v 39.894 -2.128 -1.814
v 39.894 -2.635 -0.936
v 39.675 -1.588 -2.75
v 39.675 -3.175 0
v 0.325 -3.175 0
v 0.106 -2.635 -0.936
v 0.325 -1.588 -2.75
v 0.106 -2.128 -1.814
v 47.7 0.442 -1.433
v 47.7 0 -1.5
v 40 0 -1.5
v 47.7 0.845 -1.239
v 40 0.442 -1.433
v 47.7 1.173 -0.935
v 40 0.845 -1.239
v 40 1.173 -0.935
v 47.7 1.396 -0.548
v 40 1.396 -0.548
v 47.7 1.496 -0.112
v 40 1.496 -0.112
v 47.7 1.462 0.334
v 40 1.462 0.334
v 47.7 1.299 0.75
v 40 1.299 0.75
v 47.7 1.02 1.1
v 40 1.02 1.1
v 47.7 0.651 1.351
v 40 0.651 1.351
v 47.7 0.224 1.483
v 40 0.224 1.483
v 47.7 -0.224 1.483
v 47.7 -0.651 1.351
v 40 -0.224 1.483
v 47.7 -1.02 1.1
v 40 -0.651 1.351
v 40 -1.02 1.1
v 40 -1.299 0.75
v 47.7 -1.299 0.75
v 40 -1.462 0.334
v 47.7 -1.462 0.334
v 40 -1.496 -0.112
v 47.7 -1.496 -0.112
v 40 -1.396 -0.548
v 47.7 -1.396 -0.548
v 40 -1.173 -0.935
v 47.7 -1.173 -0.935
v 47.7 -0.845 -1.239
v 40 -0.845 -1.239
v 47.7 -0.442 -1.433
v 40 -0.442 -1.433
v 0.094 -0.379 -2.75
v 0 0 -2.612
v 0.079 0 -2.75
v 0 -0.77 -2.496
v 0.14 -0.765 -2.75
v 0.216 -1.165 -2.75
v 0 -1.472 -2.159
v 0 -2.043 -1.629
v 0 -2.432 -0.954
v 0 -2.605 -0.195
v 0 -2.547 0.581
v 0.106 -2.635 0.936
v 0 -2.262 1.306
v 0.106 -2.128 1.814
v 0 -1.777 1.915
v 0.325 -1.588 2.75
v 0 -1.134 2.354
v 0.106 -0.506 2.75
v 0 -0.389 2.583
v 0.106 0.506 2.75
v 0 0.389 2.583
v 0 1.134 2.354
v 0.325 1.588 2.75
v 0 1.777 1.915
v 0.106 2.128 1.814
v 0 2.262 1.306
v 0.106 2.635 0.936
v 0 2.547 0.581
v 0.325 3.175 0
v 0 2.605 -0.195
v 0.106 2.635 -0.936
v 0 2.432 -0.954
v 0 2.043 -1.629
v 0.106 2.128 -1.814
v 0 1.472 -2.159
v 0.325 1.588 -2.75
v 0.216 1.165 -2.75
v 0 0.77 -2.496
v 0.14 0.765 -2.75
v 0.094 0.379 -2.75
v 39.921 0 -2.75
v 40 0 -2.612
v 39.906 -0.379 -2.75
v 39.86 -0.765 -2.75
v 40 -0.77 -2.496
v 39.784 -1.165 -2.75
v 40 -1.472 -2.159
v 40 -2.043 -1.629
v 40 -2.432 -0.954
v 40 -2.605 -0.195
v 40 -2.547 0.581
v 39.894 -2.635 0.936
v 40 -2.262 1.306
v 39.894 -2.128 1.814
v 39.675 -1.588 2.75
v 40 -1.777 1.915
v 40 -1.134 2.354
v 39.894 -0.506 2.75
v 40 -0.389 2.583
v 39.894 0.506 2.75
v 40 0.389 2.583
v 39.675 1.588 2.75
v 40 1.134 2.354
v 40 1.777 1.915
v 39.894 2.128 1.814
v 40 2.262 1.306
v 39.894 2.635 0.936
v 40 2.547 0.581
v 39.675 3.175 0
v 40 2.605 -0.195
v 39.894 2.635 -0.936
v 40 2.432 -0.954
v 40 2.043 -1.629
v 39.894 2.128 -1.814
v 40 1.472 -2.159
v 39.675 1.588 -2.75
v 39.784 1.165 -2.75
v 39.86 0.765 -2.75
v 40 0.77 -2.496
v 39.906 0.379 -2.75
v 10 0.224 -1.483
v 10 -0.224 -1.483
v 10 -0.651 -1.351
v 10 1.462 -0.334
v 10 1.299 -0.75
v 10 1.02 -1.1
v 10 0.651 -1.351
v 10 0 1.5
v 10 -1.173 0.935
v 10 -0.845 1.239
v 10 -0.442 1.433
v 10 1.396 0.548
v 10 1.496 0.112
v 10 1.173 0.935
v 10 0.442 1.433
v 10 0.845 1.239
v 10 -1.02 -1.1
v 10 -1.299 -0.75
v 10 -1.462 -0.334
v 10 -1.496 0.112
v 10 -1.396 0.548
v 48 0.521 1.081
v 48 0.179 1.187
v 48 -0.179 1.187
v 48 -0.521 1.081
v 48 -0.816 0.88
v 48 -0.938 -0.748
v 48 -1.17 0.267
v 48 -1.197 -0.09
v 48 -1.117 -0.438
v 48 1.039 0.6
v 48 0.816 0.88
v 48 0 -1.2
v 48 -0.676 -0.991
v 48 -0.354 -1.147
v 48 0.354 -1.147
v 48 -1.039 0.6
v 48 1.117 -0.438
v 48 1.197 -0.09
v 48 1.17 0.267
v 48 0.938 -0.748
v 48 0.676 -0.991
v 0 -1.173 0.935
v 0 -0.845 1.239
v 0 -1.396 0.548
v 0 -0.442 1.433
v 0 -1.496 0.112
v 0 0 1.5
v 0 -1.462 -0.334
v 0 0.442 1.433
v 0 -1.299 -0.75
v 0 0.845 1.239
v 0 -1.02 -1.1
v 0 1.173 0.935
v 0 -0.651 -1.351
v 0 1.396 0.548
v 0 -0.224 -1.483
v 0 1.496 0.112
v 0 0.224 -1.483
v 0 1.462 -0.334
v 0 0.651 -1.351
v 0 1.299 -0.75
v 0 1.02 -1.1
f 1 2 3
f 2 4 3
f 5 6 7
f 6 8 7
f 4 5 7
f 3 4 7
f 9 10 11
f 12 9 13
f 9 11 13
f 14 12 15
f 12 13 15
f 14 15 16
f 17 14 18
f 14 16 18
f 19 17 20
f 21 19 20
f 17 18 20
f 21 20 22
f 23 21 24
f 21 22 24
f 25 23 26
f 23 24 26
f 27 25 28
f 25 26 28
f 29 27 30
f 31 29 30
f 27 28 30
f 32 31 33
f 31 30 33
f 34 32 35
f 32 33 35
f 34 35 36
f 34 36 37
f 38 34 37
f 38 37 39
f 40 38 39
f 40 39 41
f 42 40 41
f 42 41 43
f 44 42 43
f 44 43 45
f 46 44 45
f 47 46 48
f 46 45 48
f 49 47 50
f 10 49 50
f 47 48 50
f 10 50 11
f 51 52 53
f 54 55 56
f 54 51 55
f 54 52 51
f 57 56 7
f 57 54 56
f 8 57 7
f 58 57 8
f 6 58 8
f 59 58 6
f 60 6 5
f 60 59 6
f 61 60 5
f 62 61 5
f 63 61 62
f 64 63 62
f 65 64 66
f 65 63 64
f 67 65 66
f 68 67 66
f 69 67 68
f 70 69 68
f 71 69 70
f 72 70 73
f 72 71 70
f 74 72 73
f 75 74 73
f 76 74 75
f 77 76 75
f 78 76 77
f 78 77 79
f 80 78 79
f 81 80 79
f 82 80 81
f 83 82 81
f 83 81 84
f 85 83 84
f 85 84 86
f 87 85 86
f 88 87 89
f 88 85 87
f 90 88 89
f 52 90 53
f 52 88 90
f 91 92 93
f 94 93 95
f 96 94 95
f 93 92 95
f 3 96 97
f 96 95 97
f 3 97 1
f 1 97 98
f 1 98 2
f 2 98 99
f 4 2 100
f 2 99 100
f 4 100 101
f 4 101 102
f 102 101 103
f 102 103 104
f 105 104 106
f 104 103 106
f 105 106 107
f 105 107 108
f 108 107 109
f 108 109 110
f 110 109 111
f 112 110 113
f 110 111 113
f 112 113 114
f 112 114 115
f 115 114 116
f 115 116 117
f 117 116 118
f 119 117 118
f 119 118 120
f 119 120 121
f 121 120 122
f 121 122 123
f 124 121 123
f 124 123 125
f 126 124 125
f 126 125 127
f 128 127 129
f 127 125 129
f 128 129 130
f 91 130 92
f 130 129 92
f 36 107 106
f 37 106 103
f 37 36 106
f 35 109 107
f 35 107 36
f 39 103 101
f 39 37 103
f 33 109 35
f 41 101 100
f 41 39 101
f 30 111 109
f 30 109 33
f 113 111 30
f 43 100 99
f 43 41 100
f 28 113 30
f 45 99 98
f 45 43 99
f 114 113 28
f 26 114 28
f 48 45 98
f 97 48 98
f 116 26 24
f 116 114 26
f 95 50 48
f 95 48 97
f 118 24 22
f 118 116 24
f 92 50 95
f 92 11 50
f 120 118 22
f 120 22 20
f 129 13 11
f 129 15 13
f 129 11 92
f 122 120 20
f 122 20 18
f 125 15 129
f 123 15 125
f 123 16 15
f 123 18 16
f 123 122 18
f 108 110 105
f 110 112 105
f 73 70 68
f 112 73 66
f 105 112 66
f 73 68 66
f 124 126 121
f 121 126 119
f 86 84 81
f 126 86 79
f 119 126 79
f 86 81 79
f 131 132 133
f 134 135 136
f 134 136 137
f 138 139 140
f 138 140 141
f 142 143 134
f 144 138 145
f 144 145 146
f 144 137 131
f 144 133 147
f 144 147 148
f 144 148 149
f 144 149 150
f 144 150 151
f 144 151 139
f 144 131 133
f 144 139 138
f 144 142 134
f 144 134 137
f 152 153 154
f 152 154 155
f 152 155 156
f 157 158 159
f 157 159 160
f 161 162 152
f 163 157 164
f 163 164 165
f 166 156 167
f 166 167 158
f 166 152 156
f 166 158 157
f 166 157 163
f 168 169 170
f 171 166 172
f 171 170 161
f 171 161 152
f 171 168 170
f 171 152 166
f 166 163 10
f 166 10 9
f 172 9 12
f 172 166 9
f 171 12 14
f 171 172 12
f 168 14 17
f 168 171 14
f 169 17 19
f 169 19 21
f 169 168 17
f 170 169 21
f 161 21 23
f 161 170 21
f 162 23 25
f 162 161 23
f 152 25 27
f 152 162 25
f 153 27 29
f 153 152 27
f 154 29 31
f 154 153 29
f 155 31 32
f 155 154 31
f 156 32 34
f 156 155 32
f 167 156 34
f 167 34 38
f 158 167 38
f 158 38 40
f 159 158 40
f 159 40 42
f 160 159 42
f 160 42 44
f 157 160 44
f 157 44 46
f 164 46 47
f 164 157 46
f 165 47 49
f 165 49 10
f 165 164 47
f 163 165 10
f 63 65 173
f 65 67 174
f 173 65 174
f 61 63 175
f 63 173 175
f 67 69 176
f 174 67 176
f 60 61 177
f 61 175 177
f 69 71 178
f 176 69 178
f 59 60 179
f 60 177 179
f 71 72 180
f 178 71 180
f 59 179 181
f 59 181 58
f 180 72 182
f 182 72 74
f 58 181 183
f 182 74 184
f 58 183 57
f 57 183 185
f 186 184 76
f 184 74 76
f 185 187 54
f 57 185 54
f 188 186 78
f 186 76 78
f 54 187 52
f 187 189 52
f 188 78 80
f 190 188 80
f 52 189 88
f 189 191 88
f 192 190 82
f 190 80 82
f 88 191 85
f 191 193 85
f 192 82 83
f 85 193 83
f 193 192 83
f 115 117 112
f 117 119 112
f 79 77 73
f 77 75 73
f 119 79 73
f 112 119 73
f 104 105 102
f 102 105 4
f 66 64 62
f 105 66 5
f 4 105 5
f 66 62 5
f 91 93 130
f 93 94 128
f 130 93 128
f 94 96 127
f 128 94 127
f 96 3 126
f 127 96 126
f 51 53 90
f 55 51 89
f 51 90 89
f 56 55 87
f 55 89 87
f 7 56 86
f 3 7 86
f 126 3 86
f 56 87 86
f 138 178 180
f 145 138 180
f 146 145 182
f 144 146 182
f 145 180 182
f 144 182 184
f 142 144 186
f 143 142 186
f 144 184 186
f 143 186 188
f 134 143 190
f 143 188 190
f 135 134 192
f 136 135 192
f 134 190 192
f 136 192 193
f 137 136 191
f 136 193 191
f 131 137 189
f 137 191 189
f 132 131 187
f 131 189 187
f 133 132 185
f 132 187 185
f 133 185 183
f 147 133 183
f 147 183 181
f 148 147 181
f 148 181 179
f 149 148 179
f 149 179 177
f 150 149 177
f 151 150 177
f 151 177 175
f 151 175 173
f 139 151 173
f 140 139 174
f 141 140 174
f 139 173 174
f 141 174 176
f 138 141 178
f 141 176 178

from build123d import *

# Parameters (mm, degrees)
BOSS_EXTRUDE1_DEPTH = 40
SKETCH2_R           = 1.5
BOSS_EXTRUDE2_DEPTH = 8
SKETCH3_R           = 1.5
CUT_EXTRUDE1_DEPTH  = 10
CHAMFER1_SIZE       = 0.3


with BuildPart() as part:
    # Sketch1 → Boss-Extrude1 (new body)
    with BuildSketch(Plane(origin=(0, 0, 0), x_dir=(0, 0, -1), z_dir=(1, 0, 0))):
        Polygon((0, 3.175426481), (-2.75, 1.58771324), (-2.75, -1.58771324), (0, -3.175426481), (2.75, -1.58771324), (2.75, 1.58771324), align=None)
    extrude(amount=BOSS_EXTRUDE1_DEPTH)

    # Sketch2 → Boss-Extrude2 (add)
    with BuildSketch(Plane(origin=(40, 0, 0), x_dir=(0, 0, -1), z_dir=(1, 0, 0))):
        Circle(SKETCH2_R)
    extrude(amount=BOSS_EXTRUDE2_DEPTH)

    # Sketch3 → Cut-Extrude1 (cut)
    with BuildSketch(Plane.ZY):
        Circle(SKETCH3_R)
    extrude(amount=-CUT_EXTRUDE1_DEPTH, mode=Mode.SUBTRACT)

    # Sketch4 → Cut-Revolve1 (revolve, cut)
    with BuildSketch(Plane(origin=(0, 0, 0), x_dir=(1, 0, 0), z_dir=(0, 1, 0))):
        Polygon((0, 10.219809024), (4.392081913, 10.219809024), (0, 2.6125), align=None)
        Polygon((40, 2.6125), (40, 10.219809024), (35.607918087, 10.219809024), align=None)
    revolve(axis=Axis((0, 0, 0), (-1, 0, 0)), mode=Mode.SUBTRACT)

    # Chamfer1
    chamfer1_edges = [part.edges().sort_by_distance(p)[0] for p in [
        (48, 0, 1.5),
    ]]
    chamfer(chamfer1_edges, length=CHAMFER1_SIZE)


solid = part.part
